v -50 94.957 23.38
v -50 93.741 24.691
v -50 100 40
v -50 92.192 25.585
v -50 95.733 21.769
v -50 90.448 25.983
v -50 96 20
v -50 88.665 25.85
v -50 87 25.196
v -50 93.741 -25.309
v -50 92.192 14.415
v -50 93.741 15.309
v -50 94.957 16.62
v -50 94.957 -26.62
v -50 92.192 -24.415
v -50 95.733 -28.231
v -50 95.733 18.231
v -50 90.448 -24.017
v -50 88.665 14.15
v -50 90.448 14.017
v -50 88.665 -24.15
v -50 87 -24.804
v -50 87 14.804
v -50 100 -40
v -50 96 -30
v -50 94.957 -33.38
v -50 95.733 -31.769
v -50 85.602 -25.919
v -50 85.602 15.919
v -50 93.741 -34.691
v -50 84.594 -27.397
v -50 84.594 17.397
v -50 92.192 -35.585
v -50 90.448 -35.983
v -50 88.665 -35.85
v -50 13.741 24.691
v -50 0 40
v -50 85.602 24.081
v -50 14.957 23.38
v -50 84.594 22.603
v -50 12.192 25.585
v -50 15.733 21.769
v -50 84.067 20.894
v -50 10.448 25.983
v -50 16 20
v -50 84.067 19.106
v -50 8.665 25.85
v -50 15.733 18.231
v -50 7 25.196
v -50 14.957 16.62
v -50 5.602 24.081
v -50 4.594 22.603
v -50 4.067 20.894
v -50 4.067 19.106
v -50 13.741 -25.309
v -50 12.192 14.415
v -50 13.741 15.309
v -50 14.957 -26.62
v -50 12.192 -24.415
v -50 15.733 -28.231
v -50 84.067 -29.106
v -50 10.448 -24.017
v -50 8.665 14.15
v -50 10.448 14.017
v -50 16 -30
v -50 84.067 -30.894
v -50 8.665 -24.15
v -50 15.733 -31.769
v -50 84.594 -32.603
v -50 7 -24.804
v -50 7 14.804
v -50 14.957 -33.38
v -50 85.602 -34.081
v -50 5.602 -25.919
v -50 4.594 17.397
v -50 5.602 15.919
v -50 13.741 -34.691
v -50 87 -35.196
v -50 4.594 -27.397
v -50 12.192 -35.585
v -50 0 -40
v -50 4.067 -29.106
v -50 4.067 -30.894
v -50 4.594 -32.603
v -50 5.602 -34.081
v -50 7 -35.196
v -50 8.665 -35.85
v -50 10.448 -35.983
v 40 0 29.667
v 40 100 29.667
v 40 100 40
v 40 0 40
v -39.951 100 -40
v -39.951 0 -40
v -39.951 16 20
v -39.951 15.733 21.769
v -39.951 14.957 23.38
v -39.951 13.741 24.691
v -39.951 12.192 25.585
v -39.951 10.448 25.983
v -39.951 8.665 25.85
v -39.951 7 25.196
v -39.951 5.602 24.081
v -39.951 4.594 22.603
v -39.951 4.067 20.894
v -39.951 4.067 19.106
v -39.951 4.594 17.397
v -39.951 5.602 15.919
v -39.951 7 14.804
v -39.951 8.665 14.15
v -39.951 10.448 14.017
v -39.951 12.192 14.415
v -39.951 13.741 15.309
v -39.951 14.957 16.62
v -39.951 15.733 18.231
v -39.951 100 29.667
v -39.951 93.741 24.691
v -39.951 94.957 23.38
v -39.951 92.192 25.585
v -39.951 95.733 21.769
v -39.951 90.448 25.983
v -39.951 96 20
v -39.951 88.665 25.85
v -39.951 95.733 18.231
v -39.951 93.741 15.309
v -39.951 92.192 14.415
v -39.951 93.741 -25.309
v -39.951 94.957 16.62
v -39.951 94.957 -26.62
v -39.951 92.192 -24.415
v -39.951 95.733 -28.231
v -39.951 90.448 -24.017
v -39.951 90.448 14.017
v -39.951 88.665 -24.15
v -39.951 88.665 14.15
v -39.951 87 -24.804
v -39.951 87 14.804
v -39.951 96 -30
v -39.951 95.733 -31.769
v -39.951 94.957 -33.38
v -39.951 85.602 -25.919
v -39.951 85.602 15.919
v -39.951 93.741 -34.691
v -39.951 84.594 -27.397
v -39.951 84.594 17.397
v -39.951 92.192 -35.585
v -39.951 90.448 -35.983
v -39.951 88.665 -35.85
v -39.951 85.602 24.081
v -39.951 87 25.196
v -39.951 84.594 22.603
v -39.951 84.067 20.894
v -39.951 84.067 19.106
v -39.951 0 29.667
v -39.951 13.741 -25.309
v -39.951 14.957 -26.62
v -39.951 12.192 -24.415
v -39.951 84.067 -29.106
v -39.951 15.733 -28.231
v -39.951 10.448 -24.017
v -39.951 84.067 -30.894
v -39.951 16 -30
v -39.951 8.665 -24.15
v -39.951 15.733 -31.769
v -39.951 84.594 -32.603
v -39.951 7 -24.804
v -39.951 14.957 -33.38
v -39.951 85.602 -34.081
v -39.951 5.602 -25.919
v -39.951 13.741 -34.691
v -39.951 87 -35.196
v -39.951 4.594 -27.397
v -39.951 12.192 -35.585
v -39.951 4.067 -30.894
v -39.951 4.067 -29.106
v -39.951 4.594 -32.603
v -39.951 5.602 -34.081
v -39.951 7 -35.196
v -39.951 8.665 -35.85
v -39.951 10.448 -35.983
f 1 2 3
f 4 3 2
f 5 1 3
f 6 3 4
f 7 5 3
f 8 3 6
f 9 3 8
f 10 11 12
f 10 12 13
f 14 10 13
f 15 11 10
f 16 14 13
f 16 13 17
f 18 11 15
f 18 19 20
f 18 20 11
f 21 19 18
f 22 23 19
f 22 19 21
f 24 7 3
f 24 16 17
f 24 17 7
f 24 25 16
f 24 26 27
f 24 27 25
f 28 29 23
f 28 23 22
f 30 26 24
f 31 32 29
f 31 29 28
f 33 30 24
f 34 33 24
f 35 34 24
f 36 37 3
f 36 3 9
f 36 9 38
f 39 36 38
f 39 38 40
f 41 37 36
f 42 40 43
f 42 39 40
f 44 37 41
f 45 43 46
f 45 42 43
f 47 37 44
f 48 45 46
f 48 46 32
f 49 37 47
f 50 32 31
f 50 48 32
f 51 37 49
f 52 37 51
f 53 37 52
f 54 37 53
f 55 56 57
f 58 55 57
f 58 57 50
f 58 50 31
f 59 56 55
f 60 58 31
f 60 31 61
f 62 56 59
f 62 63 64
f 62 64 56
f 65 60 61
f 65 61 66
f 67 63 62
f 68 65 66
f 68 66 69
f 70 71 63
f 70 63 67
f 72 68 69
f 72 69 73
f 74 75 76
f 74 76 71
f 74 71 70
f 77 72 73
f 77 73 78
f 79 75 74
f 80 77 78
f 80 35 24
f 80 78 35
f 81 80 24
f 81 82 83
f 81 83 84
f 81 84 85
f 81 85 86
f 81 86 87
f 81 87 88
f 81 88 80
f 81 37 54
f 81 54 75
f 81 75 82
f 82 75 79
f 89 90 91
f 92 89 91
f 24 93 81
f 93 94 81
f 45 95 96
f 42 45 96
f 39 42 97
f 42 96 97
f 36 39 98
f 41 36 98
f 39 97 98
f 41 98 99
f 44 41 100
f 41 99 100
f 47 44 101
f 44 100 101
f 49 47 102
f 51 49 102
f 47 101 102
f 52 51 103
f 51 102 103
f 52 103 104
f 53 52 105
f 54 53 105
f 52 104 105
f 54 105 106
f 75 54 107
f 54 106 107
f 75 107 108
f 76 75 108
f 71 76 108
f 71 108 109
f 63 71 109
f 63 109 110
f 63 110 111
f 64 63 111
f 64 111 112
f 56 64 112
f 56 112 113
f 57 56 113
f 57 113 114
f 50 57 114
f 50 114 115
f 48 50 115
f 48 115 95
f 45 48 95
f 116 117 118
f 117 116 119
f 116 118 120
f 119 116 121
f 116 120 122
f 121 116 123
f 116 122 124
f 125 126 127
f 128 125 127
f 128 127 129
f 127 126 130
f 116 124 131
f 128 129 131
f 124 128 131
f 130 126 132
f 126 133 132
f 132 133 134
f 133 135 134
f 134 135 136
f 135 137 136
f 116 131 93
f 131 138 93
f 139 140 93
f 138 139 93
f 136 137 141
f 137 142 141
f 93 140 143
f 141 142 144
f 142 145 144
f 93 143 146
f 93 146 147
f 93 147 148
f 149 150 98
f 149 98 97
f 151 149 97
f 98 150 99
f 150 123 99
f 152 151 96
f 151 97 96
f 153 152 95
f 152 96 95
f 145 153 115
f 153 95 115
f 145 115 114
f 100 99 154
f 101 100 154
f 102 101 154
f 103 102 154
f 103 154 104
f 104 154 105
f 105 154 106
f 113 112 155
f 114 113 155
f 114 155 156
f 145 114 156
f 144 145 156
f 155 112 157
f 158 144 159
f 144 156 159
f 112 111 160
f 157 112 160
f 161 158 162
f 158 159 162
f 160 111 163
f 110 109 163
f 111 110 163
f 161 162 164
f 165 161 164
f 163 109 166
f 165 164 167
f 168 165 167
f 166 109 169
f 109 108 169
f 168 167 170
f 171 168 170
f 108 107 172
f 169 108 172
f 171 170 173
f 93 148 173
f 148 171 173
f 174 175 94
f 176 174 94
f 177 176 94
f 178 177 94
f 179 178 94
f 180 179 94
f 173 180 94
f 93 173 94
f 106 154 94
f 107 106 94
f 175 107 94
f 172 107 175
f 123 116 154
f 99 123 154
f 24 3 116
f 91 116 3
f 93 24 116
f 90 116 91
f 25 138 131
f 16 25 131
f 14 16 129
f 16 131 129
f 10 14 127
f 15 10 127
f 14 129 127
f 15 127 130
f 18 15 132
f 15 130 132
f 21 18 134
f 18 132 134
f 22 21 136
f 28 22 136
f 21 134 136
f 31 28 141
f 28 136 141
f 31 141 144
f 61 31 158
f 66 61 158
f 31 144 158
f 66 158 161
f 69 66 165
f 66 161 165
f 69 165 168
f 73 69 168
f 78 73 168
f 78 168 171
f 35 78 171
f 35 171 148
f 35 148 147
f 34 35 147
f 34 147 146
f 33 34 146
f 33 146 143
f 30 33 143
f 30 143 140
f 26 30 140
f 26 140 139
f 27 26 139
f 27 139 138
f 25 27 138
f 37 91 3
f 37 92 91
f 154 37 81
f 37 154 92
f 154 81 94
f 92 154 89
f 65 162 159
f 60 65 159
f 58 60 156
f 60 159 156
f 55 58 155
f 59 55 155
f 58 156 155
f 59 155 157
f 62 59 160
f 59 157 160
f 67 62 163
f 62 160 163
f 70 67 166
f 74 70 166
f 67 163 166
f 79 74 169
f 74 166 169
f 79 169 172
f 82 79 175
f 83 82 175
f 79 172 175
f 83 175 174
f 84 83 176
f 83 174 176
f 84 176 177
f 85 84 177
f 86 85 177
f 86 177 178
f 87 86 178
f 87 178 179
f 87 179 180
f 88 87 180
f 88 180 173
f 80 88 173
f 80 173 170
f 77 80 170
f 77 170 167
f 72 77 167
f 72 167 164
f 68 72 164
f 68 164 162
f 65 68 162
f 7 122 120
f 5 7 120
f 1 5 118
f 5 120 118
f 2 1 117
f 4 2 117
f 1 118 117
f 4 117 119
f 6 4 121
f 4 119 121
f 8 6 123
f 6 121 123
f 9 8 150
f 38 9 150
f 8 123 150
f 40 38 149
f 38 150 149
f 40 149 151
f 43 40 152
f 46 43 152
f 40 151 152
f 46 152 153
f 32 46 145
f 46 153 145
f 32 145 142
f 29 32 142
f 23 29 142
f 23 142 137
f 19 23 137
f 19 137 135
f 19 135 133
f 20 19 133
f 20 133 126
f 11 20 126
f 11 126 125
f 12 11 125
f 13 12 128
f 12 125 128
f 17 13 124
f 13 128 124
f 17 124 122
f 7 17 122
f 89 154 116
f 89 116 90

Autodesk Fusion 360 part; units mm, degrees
sketch "Sketch1" plane through (0, 0, 0) normal (0, 1, 0) x (1, 0, 0)
  line L0 (-39.9507, -29.6666) -> (-39.6666, -29.6666)
  line L1 (-39.9507, -29.6666) -> (-39.9507, 40)
  line L2 (-39.9507, 40) -> (-50, 40)
  line L3 (-50, 40) -> (-50, -29.6666)
  line L4 (-39.9507, -29.6666) -> (40, -29.6666)
  line L5 (40, -29.6666) -> (40, -40)
  line L6 (40, -40) -> (-39.9507, -40)
  line L7 (-50, -40) -> (-50, -29.6666)
  line L8 (-50, -40) -> (-39.9507, -40)
extrude "Extrude1" add sketch "Sketch1" along normal blind 100
sketch "Sketch2" plane through (-39.9507, 0, 0) normal (1, 0, 0) x (0, 1, 0)
  line L0 (0, 29.6666) -> (0, -40)
  line L1 (0, -40) -> (100, -40)
  line L2 (100, -40) -> (100, 29.6666)
  line L3 (100, 29.6666) -> (0, 29.6666)
  circle A0 centre (10, 20) radius 6
  circle A1 centre (90, 20) radius 6
  circle A2 centre (10, -30) radius 6
  circle A3 centre (90, -30) radius 6
  dimension "d3" = 12
  dimension "d6" = 80
  dimension "d7" = -50
extrude "Extrude2" cut sketch "Sketch2" against normal up to surface (10.0493 mm away) contours A0 | A1 | A2 | A3
